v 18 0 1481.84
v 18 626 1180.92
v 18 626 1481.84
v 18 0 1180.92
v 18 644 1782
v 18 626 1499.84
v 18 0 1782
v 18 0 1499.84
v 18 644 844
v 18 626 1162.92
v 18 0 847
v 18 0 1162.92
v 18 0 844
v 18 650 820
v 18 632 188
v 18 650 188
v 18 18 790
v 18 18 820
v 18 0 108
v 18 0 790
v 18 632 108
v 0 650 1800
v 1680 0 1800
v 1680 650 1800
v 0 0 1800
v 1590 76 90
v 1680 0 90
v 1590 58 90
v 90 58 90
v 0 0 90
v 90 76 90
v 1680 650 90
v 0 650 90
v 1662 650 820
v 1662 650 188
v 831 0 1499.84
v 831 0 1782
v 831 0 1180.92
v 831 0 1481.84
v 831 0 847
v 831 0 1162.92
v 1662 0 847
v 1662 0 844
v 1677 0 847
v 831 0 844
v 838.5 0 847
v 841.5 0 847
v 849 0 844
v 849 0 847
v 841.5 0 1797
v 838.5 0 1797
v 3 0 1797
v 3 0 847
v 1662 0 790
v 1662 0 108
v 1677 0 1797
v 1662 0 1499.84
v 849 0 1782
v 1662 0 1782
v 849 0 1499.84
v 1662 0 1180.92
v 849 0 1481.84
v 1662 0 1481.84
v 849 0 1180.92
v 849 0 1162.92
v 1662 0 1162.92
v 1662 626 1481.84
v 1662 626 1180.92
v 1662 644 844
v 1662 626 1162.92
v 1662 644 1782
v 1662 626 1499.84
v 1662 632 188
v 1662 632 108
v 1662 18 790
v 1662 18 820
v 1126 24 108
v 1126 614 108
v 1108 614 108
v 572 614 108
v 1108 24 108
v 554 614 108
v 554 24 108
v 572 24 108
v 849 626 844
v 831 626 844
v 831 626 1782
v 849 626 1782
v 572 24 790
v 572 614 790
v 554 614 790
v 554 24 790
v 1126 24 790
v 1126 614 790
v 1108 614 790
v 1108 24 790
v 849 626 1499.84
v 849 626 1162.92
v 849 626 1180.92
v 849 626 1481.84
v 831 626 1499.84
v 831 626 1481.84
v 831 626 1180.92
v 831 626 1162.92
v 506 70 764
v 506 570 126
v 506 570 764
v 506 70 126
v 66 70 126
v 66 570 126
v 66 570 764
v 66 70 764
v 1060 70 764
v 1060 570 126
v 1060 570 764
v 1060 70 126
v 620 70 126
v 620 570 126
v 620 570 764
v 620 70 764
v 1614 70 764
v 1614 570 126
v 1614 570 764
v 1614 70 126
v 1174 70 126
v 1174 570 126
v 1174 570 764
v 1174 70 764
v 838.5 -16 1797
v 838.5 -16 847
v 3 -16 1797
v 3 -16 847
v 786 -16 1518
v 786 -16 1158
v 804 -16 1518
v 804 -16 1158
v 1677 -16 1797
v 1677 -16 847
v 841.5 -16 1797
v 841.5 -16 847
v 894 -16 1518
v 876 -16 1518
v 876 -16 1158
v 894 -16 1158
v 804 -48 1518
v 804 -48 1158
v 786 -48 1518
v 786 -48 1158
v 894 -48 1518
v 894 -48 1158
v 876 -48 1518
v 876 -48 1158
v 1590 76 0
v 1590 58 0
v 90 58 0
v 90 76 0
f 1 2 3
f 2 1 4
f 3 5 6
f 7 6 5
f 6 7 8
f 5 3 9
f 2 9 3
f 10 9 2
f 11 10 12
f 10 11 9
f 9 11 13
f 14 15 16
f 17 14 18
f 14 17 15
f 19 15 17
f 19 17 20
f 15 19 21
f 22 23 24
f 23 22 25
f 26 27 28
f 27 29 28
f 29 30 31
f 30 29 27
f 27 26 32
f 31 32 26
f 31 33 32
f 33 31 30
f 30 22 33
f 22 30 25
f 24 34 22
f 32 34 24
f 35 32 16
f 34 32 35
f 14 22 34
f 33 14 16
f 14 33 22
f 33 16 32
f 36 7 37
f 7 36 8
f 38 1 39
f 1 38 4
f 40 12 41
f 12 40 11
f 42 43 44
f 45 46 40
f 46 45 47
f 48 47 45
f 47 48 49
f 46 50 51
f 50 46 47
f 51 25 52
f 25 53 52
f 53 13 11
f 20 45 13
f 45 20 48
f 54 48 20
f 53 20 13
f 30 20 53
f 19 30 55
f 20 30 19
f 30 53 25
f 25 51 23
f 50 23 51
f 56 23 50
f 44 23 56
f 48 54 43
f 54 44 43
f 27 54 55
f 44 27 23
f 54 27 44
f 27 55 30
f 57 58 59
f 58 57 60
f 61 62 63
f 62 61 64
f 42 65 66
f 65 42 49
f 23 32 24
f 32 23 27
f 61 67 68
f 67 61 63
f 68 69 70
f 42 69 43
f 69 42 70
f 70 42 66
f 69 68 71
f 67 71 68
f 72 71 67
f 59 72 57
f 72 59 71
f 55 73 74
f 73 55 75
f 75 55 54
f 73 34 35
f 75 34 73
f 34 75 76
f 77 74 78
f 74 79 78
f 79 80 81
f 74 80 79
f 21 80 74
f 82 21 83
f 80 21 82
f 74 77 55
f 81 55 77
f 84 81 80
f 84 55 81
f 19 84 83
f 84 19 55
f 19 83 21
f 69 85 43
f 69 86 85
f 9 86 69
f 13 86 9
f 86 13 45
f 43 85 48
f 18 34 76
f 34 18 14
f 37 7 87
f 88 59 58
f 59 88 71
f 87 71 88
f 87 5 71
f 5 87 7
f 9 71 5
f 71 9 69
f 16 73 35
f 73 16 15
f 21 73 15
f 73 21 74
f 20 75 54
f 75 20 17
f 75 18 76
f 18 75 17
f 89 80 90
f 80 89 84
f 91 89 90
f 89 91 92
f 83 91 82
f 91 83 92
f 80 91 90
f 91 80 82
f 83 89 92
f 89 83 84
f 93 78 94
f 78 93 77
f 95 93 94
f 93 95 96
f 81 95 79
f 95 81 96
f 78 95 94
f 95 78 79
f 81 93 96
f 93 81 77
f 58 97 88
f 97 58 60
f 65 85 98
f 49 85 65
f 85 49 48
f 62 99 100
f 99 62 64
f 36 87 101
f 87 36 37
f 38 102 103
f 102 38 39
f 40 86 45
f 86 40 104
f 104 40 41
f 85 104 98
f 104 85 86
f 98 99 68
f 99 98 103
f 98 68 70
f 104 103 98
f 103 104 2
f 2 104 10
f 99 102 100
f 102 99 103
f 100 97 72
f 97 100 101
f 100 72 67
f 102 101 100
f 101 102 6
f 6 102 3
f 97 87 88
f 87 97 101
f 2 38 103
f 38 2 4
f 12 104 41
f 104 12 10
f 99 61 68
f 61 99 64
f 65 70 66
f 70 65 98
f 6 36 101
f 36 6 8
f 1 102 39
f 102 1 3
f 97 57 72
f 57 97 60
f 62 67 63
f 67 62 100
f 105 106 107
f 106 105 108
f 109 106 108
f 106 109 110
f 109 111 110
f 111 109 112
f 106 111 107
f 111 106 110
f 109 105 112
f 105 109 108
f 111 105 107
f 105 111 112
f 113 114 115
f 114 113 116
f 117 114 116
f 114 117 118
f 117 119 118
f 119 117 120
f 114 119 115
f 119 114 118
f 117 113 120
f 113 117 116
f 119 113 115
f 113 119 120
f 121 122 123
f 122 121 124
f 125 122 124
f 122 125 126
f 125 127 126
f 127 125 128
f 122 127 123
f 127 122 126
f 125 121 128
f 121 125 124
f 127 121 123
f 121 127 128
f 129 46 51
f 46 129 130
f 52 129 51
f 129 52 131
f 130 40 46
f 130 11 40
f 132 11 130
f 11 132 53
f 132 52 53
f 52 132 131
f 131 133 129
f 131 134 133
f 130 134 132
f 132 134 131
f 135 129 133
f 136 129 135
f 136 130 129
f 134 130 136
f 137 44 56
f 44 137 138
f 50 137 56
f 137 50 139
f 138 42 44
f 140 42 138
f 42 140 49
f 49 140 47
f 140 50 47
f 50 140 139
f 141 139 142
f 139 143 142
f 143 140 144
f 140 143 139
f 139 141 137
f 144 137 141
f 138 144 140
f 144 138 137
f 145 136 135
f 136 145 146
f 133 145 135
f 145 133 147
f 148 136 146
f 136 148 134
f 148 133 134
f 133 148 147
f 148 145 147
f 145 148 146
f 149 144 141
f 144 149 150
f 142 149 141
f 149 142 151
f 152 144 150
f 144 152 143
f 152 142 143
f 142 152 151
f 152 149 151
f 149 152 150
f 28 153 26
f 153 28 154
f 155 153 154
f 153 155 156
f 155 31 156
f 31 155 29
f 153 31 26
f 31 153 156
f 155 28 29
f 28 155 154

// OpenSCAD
// Cupboard benchmark generated for OpenSCAD.
// Units: millimeters. Coordinate system: X width, Y depth, Z up.
$fn = 32;

module part_box(label, pos, size, rgb) {
  // OpenSCAD does not preserve part names in mesh output; label is kept for source readability.
  color(rgb) translate(pos) cube(size, center = false);
}

part_box("left_side", [0.0000, 0.0000, 90.0000], [18.0000, 650.0000, 1710.0000], [0.8039, 0.6706, 0.4549]);
part_box("right_side", [1662.0000, 0.0000, 90.0000], [18.0000, 650.0000, 1710.0000], [0.8039, 0.6706, 0.4549]);
part_box("bottom_deck", [18.0000, 0.0000, 90.0000], [1644.0000, 650.0000, 18.0000], [0.6745, 0.5176, 0.3216]);
part_box("trash_counter_deck", [18.0000, 0.0000, 820.0000], [1644.0000, 650.0000, 24.0000], [0.6745, 0.5176, 0.3216]);
part_box("top_panel", [18.0000, 0.0000, 1782.0000], [1644.0000, 650.0000, 18.0000], [0.6745, 0.5176, 0.3216]);
part_box("upper_back_panel", [18.0000, 644.0000, 844.0000], [1644.0000, 6.0000, 938.0000], [0.6902, 0.7255, 0.7020]);
part_box("lower_rear_rail", [18.0000, 632.0000, 108.0000], [1644.0000, 18.0000, 80.0000], [0.6745, 0.5176, 0.3216]);
part_box("lower_front_rail", [18.0000, 0.0000, 790.0000], [1644.0000, 18.0000, 30.0000], [0.6745, 0.5176, 0.3216]);
part_box("trash_bay_divider_1", [554.0000, 24.0000, 108.0000], [18.0000, 590.0000, 682.0000], [0.8039, 0.6706, 0.4549]);
part_box("trash_bay_divider_2", [1108.0000, 24.0000, 108.0000], [18.0000, 590.0000, 682.0000], [0.8039, 0.6706, 0.4549]);
part_box("upper_center_divider", [831.0000, 0.0000, 844.0000], [18.0000, 626.0000, 938.0000], [0.8039, 0.6706, 0.4549]);
part_box("left_adjustable_shelf_1", [18.0000, 0.0000, 1162.9200], [813.0000, 626.0000, 18.0000], [0.8392, 0.7255, 0.5137]);
part_box("right_adjustable_shelf_1", [849.0000, 0.0000, 1162.9200], [813.0000, 626.0000, 18.0000], [0.8392, 0.7255, 0.5137]);
part_box("left_adjustable_shelf_2", [18.0000, 0.0000, 1481.8400], [813.0000, 626.0000, 18.0000], [0.8392, 0.7255, 0.5137]);
part_box("right_adjustable_shelf_2", [849.0000, 0.0000, 1481.8400], [813.0000, 626.0000, 18.0000], [0.8392, 0.7255, 0.5137]);
part_box("trash_bin_1", [66.0000, 70.0000, 126.0000], [440.0000, 500.0000, 620.0000], [0.4078, 0.4863, 0.5098]);
part_box("trash_bin_1_lid", [66.0000, 70.0000, 746.0000], [440.0000, 500.0000, 18.0000], [0.2275, 0.2706, 0.2902]);
part_box("trash_bin_2", [620.0000, 70.0000, 126.0000], [440.0000, 500.0000, 620.0000], [0.3725, 0.5176, 0.4235]);
part_box("trash_bin_2_lid", [620.0000, 70.0000, 746.0000], [440.0000, 500.0000, 18.0000], [0.2275, 0.2706, 0.2902]);
part_box("trash_bin_3", [1174.0000, 70.0000, 126.0000], [440.0000, 500.0000, 620.0000], [0.4941, 0.4784, 0.4235]);
part_box("trash_bin_3_lid", [1174.0000, 70.0000, 746.0000], [440.0000, 500.0000, 18.0000], [0.2275, 0.2706, 0.2902]);
part_box("upper_left_door", [3.0000, -16.0000, 847.0000], [835.5000, 16.0000, 950.0000], [0.9020, 0.8392, 0.7098]);
part_box("upper_right_door", [841.5000, -16.0000, 847.0000], [835.5000, 16.0000, 950.0000], [0.9020, 0.8392, 0.7098]);
part_box("left_handle", [786.0000, -48.0000, 1158.0000], [18.0000, 32.0000, 360.0000], [0.1804, 0.1922, 0.2039]);
part_box("right_handle", [876.0000, -48.0000, 1158.0000], [18.0000, 32.0000, 360.0000], [0.1804, 0.1922, 0.2039]);
part_box("recessed_toe_kick", [90.0000, 58.0000, 0.0000], [1500.0000, 18.0000, 90.0000], [0.3059, 0.2863, 0.2627]);
